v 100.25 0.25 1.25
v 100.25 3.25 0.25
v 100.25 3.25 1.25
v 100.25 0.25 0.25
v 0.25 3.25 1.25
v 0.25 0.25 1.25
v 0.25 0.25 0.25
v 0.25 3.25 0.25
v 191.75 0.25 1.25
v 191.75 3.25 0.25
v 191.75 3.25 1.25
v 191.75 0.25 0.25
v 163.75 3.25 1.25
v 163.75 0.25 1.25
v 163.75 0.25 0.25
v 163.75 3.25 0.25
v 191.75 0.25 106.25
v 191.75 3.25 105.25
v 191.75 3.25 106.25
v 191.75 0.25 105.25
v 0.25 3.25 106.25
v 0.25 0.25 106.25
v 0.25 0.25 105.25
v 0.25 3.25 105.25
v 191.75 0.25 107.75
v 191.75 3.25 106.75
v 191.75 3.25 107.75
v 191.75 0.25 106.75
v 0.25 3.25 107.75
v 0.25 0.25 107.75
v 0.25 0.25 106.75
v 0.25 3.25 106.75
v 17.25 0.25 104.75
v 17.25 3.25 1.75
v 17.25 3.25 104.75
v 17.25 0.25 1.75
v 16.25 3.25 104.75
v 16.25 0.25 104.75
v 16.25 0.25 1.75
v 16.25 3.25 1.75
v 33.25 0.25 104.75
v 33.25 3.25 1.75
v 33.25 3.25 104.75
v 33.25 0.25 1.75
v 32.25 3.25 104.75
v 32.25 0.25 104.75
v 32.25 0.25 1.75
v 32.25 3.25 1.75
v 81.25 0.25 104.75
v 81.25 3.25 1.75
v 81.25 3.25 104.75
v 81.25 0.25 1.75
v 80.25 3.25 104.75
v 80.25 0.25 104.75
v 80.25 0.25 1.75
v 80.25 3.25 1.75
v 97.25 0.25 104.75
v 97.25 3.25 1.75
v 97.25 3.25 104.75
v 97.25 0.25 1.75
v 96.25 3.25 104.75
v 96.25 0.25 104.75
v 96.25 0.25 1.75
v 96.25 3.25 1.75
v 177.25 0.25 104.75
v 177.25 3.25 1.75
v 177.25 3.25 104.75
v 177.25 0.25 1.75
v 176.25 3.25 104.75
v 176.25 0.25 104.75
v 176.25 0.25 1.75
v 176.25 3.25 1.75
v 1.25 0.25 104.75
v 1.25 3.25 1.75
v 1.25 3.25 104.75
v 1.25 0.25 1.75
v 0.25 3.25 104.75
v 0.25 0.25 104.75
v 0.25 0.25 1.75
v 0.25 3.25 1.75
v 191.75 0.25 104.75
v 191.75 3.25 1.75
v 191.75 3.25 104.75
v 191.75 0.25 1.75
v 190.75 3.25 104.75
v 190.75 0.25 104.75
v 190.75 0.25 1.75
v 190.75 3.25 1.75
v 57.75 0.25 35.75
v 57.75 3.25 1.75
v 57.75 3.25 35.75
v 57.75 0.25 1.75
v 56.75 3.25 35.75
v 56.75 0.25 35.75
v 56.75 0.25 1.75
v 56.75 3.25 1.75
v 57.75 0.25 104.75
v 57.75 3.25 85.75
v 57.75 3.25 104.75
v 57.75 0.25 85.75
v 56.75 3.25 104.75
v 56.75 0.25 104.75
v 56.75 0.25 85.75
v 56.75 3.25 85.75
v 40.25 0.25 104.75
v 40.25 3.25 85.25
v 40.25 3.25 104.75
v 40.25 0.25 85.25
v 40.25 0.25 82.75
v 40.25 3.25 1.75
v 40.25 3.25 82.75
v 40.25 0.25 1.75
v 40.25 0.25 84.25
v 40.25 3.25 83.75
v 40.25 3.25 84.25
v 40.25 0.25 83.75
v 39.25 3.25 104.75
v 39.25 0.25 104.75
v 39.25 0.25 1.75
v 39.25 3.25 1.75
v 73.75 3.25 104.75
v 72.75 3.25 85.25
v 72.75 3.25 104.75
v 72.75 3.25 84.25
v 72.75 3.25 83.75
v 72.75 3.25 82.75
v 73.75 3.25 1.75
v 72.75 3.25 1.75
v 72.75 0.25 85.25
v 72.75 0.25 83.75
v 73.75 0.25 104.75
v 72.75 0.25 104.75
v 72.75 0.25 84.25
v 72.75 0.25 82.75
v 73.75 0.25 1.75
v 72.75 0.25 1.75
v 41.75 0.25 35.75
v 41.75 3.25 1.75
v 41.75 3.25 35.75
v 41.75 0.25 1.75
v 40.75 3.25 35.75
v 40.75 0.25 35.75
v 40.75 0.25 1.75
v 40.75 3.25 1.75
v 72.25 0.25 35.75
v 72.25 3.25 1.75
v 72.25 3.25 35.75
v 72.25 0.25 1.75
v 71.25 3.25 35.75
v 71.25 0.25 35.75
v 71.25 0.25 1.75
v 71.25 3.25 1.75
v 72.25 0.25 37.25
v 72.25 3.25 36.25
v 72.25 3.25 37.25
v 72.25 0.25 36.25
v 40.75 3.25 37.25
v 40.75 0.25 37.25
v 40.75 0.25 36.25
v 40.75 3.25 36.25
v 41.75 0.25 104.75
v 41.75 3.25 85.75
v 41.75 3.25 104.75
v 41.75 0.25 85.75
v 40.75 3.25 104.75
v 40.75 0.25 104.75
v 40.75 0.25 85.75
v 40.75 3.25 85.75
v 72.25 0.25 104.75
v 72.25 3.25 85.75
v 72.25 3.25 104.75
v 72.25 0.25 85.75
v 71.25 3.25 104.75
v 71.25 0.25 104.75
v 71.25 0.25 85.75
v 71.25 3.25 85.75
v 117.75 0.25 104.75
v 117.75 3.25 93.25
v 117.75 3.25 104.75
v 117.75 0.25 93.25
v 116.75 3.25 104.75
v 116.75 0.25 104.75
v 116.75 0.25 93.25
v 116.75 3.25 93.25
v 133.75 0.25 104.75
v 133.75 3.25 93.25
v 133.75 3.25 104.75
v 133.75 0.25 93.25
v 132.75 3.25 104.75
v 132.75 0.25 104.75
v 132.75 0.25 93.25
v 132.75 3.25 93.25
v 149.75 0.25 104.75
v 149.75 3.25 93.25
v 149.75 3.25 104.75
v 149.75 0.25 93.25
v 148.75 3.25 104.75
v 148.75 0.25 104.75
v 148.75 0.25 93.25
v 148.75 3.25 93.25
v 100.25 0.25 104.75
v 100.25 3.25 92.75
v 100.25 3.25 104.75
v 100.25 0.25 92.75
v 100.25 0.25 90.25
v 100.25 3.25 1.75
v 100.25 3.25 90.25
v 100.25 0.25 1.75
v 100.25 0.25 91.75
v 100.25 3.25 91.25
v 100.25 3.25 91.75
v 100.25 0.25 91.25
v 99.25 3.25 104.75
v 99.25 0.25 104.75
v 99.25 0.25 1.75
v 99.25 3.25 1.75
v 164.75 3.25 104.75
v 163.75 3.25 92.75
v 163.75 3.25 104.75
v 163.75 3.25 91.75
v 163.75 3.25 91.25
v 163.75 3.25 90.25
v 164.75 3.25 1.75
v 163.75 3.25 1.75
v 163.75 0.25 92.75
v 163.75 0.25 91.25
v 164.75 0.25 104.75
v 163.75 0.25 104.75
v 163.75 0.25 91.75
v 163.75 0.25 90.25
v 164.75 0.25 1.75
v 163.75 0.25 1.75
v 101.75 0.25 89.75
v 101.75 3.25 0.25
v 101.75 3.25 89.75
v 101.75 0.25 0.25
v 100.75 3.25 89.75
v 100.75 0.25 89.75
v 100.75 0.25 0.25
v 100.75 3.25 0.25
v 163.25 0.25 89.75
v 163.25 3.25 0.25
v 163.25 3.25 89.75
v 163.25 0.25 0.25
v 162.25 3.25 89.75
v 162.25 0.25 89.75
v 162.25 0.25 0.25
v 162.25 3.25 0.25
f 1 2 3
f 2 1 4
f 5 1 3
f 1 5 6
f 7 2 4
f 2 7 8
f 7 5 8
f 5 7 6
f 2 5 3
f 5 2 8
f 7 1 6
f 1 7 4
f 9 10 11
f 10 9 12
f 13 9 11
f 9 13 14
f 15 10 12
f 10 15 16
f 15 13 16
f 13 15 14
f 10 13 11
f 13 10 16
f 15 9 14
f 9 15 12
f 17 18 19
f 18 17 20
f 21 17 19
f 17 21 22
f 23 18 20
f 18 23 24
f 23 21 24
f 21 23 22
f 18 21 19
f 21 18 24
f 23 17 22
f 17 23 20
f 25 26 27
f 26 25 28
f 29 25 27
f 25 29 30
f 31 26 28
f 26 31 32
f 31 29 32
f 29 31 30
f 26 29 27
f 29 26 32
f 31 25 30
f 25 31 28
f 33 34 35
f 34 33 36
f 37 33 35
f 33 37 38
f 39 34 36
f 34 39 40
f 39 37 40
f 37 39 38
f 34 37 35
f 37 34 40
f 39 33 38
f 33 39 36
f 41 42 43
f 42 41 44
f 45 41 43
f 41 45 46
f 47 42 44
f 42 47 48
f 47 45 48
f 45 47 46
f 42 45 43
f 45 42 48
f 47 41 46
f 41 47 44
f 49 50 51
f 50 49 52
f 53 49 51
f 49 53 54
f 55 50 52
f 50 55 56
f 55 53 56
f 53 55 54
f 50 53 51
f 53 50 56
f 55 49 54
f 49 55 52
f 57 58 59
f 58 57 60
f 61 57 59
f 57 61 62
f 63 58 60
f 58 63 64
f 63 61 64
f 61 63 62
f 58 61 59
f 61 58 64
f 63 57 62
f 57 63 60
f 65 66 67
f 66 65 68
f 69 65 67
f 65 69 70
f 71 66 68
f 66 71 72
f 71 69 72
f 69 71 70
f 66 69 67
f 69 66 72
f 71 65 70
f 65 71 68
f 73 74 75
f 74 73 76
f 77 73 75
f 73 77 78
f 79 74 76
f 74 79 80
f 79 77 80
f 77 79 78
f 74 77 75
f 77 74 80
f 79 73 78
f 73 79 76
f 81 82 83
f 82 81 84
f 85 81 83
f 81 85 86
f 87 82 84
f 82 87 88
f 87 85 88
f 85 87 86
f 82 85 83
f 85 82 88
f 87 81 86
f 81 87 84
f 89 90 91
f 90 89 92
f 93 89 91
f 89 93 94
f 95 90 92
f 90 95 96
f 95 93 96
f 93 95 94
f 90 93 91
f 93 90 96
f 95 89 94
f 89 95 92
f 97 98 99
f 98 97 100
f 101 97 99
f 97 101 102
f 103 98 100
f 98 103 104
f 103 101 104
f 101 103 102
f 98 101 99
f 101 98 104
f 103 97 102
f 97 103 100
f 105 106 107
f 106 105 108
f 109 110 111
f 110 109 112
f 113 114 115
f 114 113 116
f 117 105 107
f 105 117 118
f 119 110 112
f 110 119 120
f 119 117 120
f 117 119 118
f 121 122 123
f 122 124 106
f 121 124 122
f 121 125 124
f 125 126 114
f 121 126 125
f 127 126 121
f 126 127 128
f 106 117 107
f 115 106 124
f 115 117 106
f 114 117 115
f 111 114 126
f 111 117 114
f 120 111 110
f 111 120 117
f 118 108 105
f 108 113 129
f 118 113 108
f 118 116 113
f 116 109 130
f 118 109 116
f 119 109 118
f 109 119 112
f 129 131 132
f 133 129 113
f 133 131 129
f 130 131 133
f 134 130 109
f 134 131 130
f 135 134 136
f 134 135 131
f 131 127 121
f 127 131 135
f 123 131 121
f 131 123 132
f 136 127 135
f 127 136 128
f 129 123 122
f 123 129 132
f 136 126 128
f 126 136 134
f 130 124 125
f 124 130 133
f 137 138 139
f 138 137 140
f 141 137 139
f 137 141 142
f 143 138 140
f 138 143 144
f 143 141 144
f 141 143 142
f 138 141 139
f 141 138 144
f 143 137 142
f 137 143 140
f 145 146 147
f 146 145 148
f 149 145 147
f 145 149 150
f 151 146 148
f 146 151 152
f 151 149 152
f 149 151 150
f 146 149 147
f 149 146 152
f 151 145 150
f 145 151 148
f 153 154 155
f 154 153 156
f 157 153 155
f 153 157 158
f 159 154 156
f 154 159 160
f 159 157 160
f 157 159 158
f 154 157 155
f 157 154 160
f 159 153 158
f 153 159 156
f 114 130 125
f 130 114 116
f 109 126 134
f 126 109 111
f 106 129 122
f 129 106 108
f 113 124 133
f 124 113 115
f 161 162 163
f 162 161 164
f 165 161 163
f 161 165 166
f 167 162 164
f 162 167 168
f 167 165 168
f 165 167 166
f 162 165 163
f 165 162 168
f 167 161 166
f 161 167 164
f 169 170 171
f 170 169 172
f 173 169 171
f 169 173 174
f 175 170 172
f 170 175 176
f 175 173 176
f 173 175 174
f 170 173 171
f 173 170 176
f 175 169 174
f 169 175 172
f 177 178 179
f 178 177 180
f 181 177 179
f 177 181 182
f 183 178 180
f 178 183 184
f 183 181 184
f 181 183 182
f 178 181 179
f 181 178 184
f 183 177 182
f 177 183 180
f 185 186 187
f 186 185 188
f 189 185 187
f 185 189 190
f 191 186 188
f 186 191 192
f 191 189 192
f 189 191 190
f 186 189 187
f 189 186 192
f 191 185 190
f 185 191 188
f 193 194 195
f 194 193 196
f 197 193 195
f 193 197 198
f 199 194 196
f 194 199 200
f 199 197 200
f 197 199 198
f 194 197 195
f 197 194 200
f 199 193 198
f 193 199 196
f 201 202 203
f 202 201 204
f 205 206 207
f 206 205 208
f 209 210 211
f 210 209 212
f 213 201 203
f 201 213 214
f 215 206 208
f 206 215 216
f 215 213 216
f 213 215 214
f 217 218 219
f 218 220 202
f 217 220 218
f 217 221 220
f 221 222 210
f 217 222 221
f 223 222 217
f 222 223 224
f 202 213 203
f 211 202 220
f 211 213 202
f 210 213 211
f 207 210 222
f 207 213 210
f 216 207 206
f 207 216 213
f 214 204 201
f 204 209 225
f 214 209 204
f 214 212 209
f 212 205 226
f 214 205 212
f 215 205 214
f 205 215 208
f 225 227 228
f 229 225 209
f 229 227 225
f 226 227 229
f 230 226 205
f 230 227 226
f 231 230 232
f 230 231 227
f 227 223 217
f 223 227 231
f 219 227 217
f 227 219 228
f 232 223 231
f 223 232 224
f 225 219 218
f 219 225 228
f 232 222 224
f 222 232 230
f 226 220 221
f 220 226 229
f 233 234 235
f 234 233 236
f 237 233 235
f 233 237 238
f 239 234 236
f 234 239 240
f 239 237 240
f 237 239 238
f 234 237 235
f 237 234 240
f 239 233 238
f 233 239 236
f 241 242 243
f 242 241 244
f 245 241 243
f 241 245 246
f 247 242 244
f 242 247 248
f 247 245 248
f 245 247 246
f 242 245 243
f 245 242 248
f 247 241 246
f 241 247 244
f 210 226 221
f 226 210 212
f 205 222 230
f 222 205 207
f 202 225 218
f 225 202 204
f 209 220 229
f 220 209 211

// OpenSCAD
// Framing Wall - 9' x 16' with 29"x45" window (left) and 5'x7.5' door (right)
// Units: inches — v002: boards inset by EPS to show outlines

// Wall dimensions
WALL_W = 192;   // 16'
WALL_H = 108;   // 9'

// 2x4 actual dimensions
LT = 1.5;
LW = 3.5;

// Visual gap between boards (inset on each face)
EPS = 0.25;

OC = 16;

// Window rough opening
WIN_W = 29;
WIN_H = 45;
WIN_L = 42;
WIN_SH = 36;

// Door rough opening
DOOR_W = 60;
DOOR_H = 90;
DOOR_L = 102;

// Window derived
WKL = WIN_L - 2*LT;
WJL = WIN_L - LT;
WJR = WIN_L + WIN_W;
WKR = WIN_L + WIN_W + LT;

W_SILL_Z = WIN_SH;
W_HDR_Z  = WIN_SH + LT + WIN_H;

// Door derived
DKL = DOOR_L - 2*LT;
DJL = DOOR_L - LT;
DJR = DOOR_L + DOOR_W;
DKR = DOOR_L + DOOR_W + LT;

D_HDR_Z = DOOR_H;

STUD_H = WALL_H - LT - 2*LT;

// --- Primitives with EPS inset ---

module vstud(x_pos, z_bot, height) {
    translate([x_pos + EPS, EPS, z_bot + EPS])
        cube([LT - 2*EPS, LW - 2*EPS, height - 2*EPS]);
}

module hbeam(x_pos, z_bot, width) {
    translate([x_pos + EPS, EPS, z_bot + EPS])
        cube([width - 2*EPS, LW - 2*EPS, LT - 2*EPS]);
}

// --- Plates ---

module bottom_plate() {
    hbeam(0, 0, DJL);
    hbeam(DJR + LT, 0, WALL_W - DJR - LT);
}

module top_plate() {
    hbeam(0, WALL_H - 2*LT, WALL_W);
    hbeam(0, WALL_H - LT,   WALL_W);
}

// --- Field studs ---

module field_studs() {
    vstud(0, LT, STUD_H);
    vstud(WALL_W - LT, LT, STUD_H);

    for (x = [OC : OC : WALL_W - LT]) {
        in_win  = (x >= WKL - 0.01) && (x <= WKR + 0.01);
        in_door = (x >= DKL - 0.01) && (x <= DKR + 0.01);
        if (!in_win && !in_door)
            vstud(x, LT, STUD_H);
    }
}

// --- Window framing ---

module window_framing() {
    vstud(WKL, LT, STUD_H);
    vstud(WKR, LT, STUD_H);

    vstud(WJL, LT, WIN_SH - LT);
    vstud(WJR, LT, WIN_SH - LT);

    hbeam(WJL, W_SILL_Z, WIN_W + 2*LT);

    hbeam(WKL, W_HDR_Z,       WIN_W + 4*LT);
    hbeam(WKL, W_HDR_Z + LT,  WIN_W + 4*LT);

    z_ahdr = W_HDR_Z + 2*LT;
    vstud(WJL, z_ahdr, WALL_H - 2*LT - z_ahdr);
    vstud(WJR, z_ahdr, WALL_H - 2*LT - z_ahdr);

    for (x = [WJL + OC : OC : WJR]) {
        if (x + LT <= WJR + 0.01) {
            vstud(x, LT, WIN_SH - LT);
            z_ahdr2 = W_HDR_Z + 2*LT;
            vstud(x, z_ahdr2, WALL_H - 2*LT - z_ahdr2);
        }
    }
}

// --- Door framing ---

module door_framing() {
    vstud(DKL, LT, STUD_H);
    vstud(DKR, LT, STUD_H);

    vstud(DJL, 0, D_HDR_Z);
    vstud(DJR, 0, D_HDR_Z);

    hbeam(DKL, D_HDR_Z,       DOOR_W + 4*LT);
    hbeam(DKL, D_HDR_Z + LT,  DOOR_W + 4*LT);

    z_ahdr = D_HDR_Z + 2*LT;
    for (x = [DJL + OC : OC : DJR]) {
        if (x + LT <= DJR + 0.01)
            vstud(x, z_ahdr, WALL_H - 2*LT - z_ahdr);
    }
}

// --- Assembly ---

color("BurlyWood") union() {
    bottom_plate();
    top_plate();
    field_studs();
    window_framing();
    door_framing();
}
